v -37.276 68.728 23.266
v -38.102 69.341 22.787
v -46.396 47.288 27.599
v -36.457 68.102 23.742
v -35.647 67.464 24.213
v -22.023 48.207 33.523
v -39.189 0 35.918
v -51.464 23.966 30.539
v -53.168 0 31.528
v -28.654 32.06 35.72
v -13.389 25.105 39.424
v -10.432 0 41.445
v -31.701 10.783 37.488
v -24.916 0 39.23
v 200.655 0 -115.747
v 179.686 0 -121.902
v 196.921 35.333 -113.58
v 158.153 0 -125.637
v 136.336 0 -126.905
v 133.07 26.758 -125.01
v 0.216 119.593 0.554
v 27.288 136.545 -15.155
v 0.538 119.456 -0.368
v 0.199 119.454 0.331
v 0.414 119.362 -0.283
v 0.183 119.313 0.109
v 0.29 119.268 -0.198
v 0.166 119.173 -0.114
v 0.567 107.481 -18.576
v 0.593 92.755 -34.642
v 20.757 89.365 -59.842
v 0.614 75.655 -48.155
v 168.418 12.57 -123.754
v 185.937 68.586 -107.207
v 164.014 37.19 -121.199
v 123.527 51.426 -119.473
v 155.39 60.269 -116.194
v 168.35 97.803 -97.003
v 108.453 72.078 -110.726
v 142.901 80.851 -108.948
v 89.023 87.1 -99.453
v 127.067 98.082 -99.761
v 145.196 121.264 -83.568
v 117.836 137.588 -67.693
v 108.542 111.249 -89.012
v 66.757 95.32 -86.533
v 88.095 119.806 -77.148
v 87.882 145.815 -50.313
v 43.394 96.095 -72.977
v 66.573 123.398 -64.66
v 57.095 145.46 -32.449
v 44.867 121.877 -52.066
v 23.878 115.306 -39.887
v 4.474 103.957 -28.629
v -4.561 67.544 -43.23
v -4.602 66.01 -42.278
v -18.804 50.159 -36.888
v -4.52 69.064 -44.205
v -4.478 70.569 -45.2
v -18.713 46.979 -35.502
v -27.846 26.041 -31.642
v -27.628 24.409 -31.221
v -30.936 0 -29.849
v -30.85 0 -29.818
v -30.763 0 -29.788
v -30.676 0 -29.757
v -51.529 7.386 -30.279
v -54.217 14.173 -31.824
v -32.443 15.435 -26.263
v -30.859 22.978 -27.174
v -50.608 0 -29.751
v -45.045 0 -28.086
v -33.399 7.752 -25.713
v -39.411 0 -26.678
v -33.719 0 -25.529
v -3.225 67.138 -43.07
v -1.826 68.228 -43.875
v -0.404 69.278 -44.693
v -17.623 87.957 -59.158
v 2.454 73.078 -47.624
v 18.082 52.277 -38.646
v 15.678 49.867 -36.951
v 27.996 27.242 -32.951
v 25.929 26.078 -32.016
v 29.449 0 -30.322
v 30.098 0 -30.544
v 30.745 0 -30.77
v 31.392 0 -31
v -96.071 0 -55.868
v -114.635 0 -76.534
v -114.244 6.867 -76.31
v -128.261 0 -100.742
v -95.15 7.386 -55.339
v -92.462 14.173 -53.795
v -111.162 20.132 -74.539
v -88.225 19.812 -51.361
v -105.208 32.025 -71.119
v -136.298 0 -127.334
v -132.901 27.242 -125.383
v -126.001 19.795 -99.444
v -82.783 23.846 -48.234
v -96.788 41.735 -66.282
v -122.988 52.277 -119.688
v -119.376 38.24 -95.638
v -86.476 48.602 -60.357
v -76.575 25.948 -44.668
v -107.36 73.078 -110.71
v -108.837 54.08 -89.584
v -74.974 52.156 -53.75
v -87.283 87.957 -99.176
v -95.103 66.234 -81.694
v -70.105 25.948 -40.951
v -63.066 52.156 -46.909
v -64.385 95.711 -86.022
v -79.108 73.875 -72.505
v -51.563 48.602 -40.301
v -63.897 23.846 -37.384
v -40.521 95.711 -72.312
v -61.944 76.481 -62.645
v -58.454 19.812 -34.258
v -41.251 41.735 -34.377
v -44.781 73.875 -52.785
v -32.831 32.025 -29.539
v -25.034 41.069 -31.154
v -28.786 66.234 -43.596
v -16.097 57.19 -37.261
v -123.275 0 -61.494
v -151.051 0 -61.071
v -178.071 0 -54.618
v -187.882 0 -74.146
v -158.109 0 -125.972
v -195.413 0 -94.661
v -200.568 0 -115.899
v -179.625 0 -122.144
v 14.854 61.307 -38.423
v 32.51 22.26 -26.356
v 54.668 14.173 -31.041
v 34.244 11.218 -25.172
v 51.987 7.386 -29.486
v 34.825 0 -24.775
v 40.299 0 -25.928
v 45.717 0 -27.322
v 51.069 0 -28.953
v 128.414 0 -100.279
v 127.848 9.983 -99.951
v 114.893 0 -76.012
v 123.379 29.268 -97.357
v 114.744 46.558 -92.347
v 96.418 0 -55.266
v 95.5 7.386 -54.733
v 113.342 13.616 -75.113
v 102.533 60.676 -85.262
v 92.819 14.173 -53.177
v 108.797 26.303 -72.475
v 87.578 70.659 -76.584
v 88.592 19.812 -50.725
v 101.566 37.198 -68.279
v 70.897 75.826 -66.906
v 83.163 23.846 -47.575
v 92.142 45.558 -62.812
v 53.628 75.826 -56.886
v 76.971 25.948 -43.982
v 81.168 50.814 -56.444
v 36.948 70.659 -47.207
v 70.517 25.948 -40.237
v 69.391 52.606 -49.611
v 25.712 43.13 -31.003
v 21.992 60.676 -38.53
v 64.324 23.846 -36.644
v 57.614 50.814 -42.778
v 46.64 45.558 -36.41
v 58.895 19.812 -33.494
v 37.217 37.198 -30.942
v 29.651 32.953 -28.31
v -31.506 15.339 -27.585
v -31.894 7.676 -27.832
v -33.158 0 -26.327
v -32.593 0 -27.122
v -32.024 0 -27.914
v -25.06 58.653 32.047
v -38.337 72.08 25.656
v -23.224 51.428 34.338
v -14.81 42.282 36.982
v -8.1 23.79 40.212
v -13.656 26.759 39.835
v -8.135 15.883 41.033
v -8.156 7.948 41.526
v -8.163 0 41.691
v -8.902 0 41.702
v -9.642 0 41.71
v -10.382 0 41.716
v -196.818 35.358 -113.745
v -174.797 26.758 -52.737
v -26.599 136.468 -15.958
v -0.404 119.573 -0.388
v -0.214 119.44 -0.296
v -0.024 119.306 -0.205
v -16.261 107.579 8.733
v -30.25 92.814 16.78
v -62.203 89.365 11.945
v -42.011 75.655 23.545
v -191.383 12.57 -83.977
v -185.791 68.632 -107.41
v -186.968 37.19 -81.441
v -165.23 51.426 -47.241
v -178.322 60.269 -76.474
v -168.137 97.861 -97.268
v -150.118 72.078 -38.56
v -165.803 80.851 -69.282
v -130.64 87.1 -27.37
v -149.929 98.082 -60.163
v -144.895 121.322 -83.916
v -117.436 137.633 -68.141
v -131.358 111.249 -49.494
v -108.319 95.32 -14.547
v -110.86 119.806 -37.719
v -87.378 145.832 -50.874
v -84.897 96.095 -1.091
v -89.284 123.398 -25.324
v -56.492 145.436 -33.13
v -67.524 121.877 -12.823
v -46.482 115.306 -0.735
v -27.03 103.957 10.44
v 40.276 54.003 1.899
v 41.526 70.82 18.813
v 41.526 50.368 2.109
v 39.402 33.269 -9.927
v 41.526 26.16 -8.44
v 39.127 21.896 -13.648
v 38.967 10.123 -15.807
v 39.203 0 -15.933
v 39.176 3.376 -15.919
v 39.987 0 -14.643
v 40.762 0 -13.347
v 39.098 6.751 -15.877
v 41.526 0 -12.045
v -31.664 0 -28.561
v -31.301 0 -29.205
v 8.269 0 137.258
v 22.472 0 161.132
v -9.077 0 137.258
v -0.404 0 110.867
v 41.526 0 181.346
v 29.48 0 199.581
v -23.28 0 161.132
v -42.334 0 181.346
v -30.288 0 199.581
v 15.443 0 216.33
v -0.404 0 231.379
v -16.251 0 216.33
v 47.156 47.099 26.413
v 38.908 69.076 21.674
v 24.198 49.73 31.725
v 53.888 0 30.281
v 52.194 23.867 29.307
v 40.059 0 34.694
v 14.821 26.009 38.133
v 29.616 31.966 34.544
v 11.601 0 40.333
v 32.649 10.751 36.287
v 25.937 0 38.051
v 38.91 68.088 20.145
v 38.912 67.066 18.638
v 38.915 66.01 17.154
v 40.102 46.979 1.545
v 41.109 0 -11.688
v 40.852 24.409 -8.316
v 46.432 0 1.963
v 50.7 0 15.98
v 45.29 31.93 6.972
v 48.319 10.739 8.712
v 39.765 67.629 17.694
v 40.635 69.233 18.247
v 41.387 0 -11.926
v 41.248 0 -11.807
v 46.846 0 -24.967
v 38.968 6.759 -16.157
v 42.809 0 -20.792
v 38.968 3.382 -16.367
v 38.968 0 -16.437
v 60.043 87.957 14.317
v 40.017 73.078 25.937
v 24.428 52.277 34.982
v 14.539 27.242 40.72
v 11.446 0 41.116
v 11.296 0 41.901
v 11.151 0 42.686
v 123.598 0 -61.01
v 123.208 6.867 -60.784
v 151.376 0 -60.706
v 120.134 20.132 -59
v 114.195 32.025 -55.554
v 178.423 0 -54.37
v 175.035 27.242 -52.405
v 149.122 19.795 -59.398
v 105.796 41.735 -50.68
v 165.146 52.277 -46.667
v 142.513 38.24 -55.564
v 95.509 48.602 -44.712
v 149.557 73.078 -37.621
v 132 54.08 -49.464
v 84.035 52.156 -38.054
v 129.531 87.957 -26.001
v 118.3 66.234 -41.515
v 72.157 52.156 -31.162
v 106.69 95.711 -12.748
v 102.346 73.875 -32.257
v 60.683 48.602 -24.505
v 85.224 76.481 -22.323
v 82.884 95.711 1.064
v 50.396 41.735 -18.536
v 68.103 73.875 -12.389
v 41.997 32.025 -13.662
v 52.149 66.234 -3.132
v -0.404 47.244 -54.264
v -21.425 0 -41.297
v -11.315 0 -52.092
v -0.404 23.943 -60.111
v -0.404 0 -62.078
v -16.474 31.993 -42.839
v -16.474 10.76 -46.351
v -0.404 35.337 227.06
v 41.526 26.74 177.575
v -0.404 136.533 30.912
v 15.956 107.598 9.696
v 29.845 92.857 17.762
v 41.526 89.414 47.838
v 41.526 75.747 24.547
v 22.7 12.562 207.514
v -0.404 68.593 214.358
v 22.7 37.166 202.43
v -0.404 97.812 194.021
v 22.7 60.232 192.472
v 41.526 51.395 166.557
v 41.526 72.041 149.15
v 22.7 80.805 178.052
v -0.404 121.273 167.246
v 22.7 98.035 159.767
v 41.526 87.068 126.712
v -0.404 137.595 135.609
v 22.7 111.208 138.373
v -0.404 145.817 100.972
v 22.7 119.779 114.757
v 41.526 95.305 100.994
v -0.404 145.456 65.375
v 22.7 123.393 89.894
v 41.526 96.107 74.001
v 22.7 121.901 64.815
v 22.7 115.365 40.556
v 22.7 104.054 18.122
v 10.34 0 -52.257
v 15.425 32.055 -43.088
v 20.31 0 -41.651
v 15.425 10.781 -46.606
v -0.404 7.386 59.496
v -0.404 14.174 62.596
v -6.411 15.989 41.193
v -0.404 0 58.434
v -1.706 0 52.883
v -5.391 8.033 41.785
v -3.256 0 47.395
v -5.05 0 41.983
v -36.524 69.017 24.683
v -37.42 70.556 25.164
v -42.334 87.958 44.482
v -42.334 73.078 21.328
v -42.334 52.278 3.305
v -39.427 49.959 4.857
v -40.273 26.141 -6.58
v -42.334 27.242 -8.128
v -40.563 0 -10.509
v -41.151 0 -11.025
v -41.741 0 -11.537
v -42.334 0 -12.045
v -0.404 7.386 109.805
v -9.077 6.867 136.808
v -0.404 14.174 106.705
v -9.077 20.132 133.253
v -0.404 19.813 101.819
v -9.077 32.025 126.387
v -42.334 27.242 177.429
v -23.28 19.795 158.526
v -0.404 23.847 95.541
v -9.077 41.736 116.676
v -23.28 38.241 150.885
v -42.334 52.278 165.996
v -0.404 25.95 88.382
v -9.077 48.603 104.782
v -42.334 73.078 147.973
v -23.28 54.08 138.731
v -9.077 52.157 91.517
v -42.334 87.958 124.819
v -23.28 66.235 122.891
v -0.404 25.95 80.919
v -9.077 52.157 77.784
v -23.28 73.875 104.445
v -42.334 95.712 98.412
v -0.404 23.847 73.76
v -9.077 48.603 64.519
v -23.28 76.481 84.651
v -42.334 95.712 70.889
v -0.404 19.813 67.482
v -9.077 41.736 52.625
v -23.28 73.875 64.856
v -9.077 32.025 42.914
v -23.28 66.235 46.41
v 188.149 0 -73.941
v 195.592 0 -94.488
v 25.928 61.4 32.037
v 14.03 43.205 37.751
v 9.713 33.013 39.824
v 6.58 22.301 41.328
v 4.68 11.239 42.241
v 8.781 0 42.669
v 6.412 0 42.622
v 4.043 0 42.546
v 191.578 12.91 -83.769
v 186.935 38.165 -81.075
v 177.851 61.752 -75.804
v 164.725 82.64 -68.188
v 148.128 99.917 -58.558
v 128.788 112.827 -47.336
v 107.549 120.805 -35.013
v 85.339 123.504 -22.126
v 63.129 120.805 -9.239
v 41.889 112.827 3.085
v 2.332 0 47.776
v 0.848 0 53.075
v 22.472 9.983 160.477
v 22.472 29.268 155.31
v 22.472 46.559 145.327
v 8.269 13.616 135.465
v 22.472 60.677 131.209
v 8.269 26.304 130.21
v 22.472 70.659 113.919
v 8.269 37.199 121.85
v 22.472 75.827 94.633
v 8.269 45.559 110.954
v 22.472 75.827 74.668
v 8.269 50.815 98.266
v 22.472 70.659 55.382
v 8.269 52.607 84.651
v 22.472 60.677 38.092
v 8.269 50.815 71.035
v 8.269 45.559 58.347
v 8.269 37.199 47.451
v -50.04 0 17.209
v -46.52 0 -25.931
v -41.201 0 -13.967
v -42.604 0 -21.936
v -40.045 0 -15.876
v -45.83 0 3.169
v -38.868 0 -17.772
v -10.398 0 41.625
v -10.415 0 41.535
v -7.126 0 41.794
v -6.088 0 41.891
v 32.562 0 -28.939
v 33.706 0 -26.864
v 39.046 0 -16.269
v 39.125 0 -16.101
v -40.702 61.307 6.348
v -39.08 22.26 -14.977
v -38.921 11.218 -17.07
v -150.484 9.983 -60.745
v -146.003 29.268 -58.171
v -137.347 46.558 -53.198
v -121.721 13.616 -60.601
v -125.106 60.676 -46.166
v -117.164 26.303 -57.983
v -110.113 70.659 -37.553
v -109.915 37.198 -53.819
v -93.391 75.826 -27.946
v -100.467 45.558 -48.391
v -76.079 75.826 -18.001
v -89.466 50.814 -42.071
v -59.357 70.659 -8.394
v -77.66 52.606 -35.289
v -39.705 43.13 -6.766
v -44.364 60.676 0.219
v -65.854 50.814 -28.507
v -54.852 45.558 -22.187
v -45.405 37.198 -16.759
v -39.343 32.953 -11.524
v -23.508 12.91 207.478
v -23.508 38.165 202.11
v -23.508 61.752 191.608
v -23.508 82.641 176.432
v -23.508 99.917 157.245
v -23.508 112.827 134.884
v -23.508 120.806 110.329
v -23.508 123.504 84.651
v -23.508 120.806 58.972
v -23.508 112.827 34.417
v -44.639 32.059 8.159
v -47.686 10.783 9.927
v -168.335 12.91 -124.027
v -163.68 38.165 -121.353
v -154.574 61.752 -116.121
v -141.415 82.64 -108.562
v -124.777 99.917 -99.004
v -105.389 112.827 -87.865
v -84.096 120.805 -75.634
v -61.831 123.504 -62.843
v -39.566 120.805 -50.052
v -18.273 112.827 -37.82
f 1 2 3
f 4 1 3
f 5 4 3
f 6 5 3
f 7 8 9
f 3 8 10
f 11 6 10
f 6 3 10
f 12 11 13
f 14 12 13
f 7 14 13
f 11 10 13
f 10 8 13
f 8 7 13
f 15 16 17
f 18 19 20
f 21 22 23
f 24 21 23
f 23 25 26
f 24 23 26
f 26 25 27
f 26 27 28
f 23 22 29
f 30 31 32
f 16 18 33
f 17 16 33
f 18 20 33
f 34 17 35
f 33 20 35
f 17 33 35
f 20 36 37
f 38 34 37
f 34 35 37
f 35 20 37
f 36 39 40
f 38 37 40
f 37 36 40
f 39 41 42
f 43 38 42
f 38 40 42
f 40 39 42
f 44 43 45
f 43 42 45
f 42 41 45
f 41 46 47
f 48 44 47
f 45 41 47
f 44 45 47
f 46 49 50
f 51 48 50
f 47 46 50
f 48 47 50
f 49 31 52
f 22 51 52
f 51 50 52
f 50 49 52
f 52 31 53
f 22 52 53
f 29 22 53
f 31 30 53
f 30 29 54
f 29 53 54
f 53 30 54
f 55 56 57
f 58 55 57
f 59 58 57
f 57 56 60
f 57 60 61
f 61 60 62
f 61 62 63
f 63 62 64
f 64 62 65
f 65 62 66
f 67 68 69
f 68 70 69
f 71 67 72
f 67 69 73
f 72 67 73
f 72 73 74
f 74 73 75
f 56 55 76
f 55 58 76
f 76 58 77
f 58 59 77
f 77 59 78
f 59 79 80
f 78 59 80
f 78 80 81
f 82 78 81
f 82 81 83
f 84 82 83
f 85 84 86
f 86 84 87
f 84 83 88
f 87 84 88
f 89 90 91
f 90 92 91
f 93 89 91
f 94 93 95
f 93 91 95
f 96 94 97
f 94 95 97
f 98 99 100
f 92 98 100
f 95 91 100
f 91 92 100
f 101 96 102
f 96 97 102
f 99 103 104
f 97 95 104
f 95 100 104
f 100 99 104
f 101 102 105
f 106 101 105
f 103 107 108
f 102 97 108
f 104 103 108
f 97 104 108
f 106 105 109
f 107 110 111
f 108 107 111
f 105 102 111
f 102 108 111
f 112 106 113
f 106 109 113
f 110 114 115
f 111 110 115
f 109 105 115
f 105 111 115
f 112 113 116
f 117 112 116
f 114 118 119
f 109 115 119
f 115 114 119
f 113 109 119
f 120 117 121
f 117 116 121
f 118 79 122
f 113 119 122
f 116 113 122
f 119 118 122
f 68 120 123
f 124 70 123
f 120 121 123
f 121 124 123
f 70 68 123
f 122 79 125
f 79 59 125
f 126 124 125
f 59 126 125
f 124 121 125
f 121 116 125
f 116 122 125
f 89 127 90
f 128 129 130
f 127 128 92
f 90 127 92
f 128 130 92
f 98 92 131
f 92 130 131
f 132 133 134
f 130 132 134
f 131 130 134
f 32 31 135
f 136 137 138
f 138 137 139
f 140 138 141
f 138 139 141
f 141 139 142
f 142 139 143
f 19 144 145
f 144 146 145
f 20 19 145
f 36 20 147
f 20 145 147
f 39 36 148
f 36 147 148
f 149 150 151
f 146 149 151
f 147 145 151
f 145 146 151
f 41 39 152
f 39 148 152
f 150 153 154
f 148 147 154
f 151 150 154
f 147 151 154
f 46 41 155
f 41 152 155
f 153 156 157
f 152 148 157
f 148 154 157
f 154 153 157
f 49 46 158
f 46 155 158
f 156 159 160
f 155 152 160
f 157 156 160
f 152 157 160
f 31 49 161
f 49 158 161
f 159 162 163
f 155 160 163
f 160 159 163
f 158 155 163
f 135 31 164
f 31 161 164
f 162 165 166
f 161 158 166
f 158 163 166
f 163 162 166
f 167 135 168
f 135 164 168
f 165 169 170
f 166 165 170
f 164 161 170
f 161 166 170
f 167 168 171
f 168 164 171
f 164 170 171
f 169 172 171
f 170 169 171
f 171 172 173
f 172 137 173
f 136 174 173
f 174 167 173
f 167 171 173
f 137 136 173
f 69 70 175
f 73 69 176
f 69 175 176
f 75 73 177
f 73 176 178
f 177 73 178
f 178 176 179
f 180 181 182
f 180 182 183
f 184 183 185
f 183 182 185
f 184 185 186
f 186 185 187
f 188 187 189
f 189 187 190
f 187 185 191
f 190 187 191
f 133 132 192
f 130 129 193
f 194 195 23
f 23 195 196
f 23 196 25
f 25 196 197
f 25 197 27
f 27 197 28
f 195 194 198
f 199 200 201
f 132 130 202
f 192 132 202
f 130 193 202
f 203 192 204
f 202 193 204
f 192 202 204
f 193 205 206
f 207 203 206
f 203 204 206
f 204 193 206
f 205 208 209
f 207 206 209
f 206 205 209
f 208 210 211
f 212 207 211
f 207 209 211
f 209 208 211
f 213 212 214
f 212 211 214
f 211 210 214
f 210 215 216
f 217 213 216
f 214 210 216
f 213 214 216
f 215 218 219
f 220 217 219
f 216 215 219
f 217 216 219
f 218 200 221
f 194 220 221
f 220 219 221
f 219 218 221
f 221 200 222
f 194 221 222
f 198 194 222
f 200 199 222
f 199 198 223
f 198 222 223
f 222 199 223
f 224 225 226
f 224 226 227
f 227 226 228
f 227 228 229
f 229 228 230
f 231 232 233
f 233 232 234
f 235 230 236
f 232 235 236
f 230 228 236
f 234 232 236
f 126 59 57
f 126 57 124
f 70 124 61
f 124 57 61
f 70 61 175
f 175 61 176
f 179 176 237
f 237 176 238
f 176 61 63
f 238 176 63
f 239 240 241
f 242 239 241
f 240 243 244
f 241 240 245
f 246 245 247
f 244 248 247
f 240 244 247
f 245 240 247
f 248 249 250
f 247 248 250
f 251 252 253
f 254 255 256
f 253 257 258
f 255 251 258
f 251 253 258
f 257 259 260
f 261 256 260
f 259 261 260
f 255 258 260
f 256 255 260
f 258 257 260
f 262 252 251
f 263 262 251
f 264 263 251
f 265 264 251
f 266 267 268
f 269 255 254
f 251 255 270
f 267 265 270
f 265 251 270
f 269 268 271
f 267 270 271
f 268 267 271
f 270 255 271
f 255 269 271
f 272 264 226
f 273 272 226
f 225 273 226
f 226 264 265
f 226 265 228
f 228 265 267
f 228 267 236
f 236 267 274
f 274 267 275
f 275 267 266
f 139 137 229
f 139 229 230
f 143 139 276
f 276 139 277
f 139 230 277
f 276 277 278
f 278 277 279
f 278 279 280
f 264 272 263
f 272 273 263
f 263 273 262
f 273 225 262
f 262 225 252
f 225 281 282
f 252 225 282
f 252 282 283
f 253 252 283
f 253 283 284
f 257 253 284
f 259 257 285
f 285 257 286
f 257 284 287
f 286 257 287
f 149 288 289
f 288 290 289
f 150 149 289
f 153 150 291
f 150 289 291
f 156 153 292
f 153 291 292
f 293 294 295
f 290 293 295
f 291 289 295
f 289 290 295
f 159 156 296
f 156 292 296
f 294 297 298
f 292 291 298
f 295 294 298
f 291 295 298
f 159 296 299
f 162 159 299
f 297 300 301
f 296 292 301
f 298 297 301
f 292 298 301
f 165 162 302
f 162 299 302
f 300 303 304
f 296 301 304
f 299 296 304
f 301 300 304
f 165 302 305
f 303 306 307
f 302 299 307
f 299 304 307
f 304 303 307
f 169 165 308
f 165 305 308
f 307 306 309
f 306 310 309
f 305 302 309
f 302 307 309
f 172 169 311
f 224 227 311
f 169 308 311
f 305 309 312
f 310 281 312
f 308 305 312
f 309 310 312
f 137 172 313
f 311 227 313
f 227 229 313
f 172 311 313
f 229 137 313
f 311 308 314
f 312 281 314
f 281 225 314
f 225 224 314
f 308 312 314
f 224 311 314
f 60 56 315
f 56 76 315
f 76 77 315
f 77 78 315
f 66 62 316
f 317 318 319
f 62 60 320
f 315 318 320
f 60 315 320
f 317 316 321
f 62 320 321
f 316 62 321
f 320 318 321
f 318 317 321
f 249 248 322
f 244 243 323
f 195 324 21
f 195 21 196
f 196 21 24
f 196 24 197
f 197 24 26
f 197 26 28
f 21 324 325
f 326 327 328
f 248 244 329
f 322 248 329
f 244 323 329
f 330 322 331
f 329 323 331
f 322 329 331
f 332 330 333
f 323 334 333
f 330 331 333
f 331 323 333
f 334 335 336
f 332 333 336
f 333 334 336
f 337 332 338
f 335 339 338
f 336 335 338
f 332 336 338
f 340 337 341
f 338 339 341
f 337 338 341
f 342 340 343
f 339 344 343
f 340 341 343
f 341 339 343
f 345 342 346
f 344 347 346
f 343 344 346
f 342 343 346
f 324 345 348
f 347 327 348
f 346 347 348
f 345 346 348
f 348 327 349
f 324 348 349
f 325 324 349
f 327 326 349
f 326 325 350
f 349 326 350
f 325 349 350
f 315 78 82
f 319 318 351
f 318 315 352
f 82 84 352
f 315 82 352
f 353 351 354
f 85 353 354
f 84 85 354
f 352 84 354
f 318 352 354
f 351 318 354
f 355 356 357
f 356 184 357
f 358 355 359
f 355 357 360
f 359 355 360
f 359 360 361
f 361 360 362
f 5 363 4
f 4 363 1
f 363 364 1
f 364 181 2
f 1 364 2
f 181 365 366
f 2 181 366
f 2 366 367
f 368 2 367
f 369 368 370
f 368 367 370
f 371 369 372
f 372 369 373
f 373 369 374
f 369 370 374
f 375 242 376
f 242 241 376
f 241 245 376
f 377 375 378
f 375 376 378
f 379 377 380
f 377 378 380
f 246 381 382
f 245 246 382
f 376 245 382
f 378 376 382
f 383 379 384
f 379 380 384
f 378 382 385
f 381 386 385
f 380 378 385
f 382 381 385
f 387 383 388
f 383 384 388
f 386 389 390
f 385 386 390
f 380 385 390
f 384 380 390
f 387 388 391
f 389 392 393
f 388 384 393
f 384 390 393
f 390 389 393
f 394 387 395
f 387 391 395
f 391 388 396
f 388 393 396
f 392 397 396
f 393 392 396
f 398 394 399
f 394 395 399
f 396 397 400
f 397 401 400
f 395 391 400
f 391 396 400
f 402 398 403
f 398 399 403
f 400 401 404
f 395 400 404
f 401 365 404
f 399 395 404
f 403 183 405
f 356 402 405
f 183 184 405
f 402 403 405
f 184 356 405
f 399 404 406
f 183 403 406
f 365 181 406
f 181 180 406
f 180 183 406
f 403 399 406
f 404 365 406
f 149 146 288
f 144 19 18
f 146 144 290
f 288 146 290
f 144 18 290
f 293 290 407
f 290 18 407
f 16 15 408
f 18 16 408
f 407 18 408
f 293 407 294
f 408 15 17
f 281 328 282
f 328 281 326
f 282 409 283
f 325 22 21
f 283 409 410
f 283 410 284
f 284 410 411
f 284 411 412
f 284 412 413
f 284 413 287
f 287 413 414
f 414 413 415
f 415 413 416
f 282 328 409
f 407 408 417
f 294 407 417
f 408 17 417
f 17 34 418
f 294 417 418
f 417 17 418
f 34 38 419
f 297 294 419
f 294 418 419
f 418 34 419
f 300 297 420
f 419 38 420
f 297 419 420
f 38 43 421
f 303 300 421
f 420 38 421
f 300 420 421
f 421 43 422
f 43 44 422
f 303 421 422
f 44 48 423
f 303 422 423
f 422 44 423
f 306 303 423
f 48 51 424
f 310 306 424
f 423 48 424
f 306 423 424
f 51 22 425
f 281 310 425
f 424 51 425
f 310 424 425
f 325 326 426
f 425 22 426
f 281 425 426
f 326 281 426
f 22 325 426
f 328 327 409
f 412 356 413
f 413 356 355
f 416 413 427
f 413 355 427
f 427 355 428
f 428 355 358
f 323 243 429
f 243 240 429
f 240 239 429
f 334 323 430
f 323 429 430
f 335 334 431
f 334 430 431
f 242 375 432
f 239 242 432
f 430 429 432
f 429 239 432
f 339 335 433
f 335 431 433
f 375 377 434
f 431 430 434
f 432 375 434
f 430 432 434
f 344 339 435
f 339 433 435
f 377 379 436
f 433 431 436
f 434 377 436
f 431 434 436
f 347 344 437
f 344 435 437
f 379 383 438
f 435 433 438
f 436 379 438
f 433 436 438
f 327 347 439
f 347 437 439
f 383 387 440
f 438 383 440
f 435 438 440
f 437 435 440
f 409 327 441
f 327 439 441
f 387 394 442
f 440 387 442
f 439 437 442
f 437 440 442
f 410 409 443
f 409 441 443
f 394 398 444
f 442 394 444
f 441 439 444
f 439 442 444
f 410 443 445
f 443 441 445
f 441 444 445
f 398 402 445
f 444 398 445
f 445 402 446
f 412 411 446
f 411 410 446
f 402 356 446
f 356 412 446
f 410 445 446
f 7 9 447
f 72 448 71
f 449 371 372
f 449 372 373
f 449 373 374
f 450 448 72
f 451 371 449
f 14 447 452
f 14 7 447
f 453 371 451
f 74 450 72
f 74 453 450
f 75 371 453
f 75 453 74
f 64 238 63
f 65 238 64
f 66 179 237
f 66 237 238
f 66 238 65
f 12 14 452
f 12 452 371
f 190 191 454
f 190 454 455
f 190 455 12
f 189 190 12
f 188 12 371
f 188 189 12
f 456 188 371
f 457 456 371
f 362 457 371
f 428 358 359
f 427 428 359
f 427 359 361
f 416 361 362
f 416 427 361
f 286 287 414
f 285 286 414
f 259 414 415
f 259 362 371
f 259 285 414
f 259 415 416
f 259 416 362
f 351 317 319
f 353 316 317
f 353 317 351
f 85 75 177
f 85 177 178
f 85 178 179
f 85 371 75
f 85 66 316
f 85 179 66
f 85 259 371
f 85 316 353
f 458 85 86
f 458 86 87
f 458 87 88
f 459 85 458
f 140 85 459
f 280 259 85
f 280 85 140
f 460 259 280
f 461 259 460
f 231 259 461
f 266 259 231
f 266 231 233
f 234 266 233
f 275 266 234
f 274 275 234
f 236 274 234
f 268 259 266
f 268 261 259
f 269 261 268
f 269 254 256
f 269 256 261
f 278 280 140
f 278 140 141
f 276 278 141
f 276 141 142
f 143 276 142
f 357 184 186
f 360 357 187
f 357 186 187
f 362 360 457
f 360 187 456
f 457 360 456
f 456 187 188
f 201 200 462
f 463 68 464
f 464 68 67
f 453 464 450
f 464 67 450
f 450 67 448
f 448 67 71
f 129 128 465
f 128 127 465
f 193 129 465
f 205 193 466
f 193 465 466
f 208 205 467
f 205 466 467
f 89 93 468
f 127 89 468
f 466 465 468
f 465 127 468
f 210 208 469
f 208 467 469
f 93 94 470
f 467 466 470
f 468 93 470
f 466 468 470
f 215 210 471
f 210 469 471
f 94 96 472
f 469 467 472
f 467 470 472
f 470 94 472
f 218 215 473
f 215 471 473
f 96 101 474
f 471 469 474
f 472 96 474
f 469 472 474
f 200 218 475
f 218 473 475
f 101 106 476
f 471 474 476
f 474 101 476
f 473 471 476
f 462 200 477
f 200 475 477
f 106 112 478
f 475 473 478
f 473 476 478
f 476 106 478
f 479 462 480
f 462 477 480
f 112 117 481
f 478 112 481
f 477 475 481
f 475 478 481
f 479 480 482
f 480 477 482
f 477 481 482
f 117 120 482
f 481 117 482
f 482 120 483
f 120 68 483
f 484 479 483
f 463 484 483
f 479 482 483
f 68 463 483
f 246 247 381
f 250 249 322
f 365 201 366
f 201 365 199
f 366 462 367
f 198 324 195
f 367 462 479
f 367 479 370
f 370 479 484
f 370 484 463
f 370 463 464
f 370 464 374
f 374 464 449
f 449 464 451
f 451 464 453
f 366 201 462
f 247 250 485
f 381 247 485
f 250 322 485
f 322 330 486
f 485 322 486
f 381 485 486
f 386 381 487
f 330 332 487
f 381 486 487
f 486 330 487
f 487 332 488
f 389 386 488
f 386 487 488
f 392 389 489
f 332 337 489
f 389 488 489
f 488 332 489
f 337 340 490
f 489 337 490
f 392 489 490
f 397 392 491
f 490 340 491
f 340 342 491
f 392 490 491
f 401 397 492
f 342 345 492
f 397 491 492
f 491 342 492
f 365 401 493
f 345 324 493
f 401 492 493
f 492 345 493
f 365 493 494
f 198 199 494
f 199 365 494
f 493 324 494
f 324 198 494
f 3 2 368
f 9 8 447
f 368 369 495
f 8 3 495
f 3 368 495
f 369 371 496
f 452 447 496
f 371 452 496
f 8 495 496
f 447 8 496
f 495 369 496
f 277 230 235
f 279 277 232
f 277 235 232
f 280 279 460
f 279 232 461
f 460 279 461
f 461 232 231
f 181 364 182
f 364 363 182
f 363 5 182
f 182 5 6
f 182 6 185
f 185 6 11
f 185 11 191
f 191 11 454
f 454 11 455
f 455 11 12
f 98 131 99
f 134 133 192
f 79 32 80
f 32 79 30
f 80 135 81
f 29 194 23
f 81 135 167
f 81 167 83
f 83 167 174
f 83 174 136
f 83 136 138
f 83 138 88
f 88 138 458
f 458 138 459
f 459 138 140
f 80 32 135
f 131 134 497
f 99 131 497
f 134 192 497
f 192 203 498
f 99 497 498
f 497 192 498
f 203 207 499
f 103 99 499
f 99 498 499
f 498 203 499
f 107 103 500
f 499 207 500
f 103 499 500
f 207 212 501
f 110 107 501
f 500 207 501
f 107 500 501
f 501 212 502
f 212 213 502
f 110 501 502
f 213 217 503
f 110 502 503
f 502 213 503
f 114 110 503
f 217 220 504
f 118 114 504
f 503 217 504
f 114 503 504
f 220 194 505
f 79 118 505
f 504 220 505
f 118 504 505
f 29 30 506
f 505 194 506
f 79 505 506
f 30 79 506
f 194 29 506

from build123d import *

# Parameters (mm, degrees)
F_4_5_LEG_REVOLVE_ANGLE = 180
F_1_6_LEG_REVOLVE_ANGLE = 180
F_2_3_LEG_REVOLVE_ANGLE = 180


with BuildPart() as part:
    # Sketch4 → 4-5 leg revolve (revolve, symmetric)
    with BuildSketch(Plane.XY.offset(84.650501395)) as f_4_5_leg_revolve_sk:
        with BuildLine():
            ThreePointArc((41.52641309, 96.695760248), (14.715809322, 64.933806829), (-0.403929917, 26.216580111))
            ThreePointArc((-0.403929917, 26.216580111), (-15.523669157, 64.933806829), (-42.334272925, 96.695760248))
            ThreePointArc((-42.334272925, 96.695760248), (-23.50790032, 123.504386992), (-0.403929917, 146.728110315))
            ThreePointArc((-0.403929917, 146.728110315), (22.700040485, 123.504386992), (41.52641309, 96.695760248))
        make_face()
    revolve(axis=Axis((-124.668530377, 0, 84.650501395), (1, 0, 0)), revolution_arc=F_4_5_LEG_REVOLVE_ANGLE / 2)
    revolve(f_4_5_leg_revolve_sk.sketch, axis=Axis((-124.668530377, 0, 84.650501395), (-1, 0, 0)), revolution_arc=F_4_5_LEG_REVOLVE_ANGLE / 2)

    # Sketch5 → 1-6 leg revolve (revolve, symmetric)
    with BuildSketch(Plane(origin=(73.448953951, 0, -42.617307843), x_dir=(-0.5018671305259788, 0, -0.8649447284639755), z_dir=(0.8649447284639755, 0, -0.5018671305259788))) as f_1_6_leg_revolve_sk:
        with BuildLine():
            ThreePointArc((41.343119895, 96.695430947), (14.532414899, 64.932986617), (-0.587125541, 26.215209445))
            ThreePointArc((-0.587125541, 26.215209445), (-15.70666598, 64.932986617), (-42.517370976, 96.695430947))
            ThreePointArc((-42.517370976, 96.695430947), (-23.691050832, 123.504095778), (-0.587125541, 146.727865418))
            ThreePointArc((-0.587125541, 146.727865418), (22.516799751, 123.504095778), (41.343119895, 96.695430947))
        make_face()
    revolve(axis=Axis((136.108076543, 0, 65.372784514), (-0.5018671305259786, 0, -0.8649447284639755)), revolution_arc=F_1_6_LEG_REVOLVE_ANGLE / 2)
    revolve(f_1_6_leg_revolve_sk.sketch, axis=Axis((136.108076543, 0, 65.372784514), (0.5018671305259786, 0, 0.8649447284639755)), revolution_arc=F_1_6_LEG_REVOLVE_ANGLE / 2)

    # Sketch6 → 2-3 leg revolve (revolve, symmetric)
    with BuildSketch(Plane(origin=(-73.632148208, 0, -42.300006082), x_dir=(-0.4981305424562493, 0, 0.8671020485918846), z_dir=(-0.8671020485918844, 0, -0.49813054245624927))) as f_2_3_leg_revolve_sk:
        with BuildLine():
            ThreePointArc((41.343119895, 96.695430947), (14.532414899, 64.932986617), (-0.587125541, 26.215209445))
            ThreePointArc((-0.587125541, 26.215209445), (-15.70666598, 64.932986617), (-42.517370976, 96.695430947))
            ThreePointArc((-42.517370976, 96.695430947), (-23.691050832, 123.504095778), (-0.587125541, 146.727865418))
            ThreePointArc((-0.587125541, 146.727865418), (22.516799751, 123.504095778), (41.343119895, 96.695430947))
        make_face()
    revolve(axis=Axis((-11.439546167, 0, -150.559444204), (-0.4981305424562494, 0, 0.8671020485918846)), revolution_arc=F_2_3_LEG_REVOLVE_ANGLE / 2)
    revolve(f_2_3_leg_revolve_sk.sketch, axis=Axis((-11.439546167, 0, -150.559444204), (0.4981305424562494, 0, -0.8671020485918846)), revolution_arc=F_2_3_LEG_REVOLVE_ANGLE / 2)


solid = part.part
